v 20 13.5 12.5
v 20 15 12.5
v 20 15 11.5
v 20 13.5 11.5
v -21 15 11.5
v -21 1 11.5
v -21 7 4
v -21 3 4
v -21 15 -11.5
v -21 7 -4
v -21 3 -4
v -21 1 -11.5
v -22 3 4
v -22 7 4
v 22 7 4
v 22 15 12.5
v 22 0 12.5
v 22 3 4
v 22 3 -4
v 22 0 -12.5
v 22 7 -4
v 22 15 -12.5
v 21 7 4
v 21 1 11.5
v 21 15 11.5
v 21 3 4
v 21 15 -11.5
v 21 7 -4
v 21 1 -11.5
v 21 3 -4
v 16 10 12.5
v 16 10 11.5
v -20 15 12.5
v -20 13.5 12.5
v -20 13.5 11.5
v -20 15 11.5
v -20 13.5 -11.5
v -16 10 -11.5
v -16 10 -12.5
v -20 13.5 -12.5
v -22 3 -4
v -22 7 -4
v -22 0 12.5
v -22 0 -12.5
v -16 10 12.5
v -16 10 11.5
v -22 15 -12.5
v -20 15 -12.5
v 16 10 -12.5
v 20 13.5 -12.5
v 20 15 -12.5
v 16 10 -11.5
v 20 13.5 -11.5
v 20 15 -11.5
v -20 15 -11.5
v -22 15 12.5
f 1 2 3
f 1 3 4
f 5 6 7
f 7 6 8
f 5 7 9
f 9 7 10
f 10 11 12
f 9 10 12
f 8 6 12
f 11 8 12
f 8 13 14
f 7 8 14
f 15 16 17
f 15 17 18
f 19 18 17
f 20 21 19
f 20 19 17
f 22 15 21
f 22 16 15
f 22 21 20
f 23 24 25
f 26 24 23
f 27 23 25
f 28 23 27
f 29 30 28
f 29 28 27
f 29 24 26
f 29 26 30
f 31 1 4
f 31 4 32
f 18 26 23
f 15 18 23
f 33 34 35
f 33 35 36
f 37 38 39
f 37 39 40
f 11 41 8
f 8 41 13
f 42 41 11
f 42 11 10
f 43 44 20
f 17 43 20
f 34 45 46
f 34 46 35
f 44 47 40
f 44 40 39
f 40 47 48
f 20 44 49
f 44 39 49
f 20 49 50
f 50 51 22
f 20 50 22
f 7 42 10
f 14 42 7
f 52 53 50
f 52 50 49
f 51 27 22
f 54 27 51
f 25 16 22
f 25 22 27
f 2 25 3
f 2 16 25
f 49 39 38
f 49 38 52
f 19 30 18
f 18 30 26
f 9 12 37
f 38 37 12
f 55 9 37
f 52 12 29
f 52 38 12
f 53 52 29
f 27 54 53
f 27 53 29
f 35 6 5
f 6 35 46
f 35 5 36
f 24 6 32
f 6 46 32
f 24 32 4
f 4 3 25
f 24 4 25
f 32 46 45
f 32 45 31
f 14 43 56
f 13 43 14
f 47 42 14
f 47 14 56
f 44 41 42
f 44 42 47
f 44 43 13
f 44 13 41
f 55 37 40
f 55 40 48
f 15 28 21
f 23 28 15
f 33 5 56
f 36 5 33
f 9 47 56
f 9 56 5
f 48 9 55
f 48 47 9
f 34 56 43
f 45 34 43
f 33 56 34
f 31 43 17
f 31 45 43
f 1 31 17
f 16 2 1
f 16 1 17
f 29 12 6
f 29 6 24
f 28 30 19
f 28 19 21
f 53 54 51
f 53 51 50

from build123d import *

# Parameters (mm, degrees)
CROQUIS1_W              = 44
CROQUIS1_H              = 25
SALIENTE_EXTRUIR2_DEPTH = 10
CROQUIS2_W              = 42
CROQUIS2_H              = 23
CORTAR_EXTRUIR1_DEPTH   = 9
SALIENTE_EXTRUIR3_DEPTH = 25
CROQUIS4_W              = 42
CROQUIS4_H              = 23
CORTAR_EXTRUIR2_DEPTH   = 28
CROQUIS5_W              = 1
CROQUIS5_H              = 23
CORTAR_EXTRUIR10_DEPTH  = 5
CROQUIS6_W              = 29.89343235
CROQUIS6_H              = 11.447342814
CORTAR_EXTRUIR11_DEPTH  = 1
CROQUIS7_W              = 31.003837105
CROQUIS7_H              = 9.868746677
CORTAR_EXTRUIR12_DEPTH  = 1
CROQUIS8_W              = 1
CROQUIS8_H              = 23
SALIENTE_EXTRUIR4_DEPTH = 5
CROQUIS9_W              = 8
CROQUIS9_H              = 4
CORTAR_EXTRUIR17_DEPTH  = 87


with BuildPart() as part:
    # Croquis1 → Saliente-Extruir2 (new body)
    with BuildSketch(Plane(origin=(0, 0, 0), x_dir=(1, 0, 0), z_dir=(0, 1, 0))):
        Rectangle(CROQUIS1_W, CROQUIS1_H)
    extrude(amount=SALIENTE_EXTRUIR2_DEPTH)

    # Croquis2 → Cortar-Extruir1 (cut)
    with BuildSketch(Plane(origin=(0, 10, 0), x_dir=(1, 0, 0), z_dir=(0, 1, 0))):
        Rectangle(CROQUIS2_W, CROQUIS2_H)
    extrude(amount=-CORTAR_EXTRUIR1_DEPTH, mode=Mode.SUBTRACT)

    # Croquis3 → Saliente-Extruir3 (add)
    with BuildSketch(Plane.XY.offset(12.5)):
        Polygon((-22, 8), (-22, 10), (-16, 10), (-20, 13.5), (-20, 15), (-23, 15), (-23, 8), align=None)
        Polygon((20, 13.5), (16, 10), (22, 10), (22, 8), (23, 8), (23, 15), (20, 15), align=None)
    extrude(amount=-SALIENTE_EXTRUIR3_DEPTH)

    # Croquis4 → Cortar-Extruir2 (cut)
    with BuildSketch(Plane(origin=(0, 1, 0), x_dir=(1, 0, 0), z_dir=(0, 1, 0))):
        Rectangle(CROQUIS4_W, CROQUIS4_H)
    extrude(amount=CORTAR_EXTRUIR2_DEPTH, mode=Mode.SUBTRACT)

    # Croquis5 → Cortar-Extruir10 (cut)
    with BuildSketch(Plane(origin=(0, 15, 0), x_dir=(1, 0, 0), z_dir=(0, 1, 0))):
        with Locations((-21.5, 0)):
            Rectangle(CROQUIS5_W, CROQUIS5_H)
        with Locations((21.5, 0)):
            Rectangle(CROQUIS5_W, CROQUIS5_H)
    extrude(amount=-CORTAR_EXTRUIR10_DEPTH, mode=Mode.SUBTRACT)

    # Croquis6 → Cortar-Extruir11 (cut)
    with BuildSketch(Plane(origin=(23, 0, 0), x_dir=(0, 0, -1), z_dir=(1, 0, 0))):
        with Locations((-0.524699003, 11.114026003)):
            Rectangle(CROQUIS6_W, CROQUIS6_H)
    extrude(amount=-CORTAR_EXTRUIR11_DEPTH, mode=Mode.SUBTRACT)

    # Croquis7 → Cortar-Extruir12 (cut)
    with BuildSketch(Plane.ZY.offset(23)):
        with Locations((-0.729719636, 12.255463236)):
            Rectangle(CROQUIS7_W, CROQUIS7_H)
    extrude(amount=-CORTAR_EXTRUIR12_DEPTH, mode=Mode.SUBTRACT)

    # Croquis8 → Saliente-Extruir4 (add)
    with BuildSketch(Plane(origin=(0, 10, 0), x_dir=(1, 0, 0), z_dir=(0, 1, 0))):
        with Locations((-21.5, 0)):
            Rectangle(CROQUIS8_W, CROQUIS8_H)
        with Locations((21.5, 0)):
            Rectangle(CROQUIS8_W, CROQUIS8_H)
    extrude(amount=SALIENTE_EXTRUIR4_DEPTH)

    # Croquis9 → Cortar-Extruir17 (cut)
    with BuildSketch(Plane.ZY.offset(22)):
        with Locations((0, 5)):
            Rectangle(CROQUIS9_W, CROQUIS9_H)
    extrude(amount=-CORTAR_EXTRUIR17_DEPTH, mode=Mode.SUBTRACT)


solid = part.part
